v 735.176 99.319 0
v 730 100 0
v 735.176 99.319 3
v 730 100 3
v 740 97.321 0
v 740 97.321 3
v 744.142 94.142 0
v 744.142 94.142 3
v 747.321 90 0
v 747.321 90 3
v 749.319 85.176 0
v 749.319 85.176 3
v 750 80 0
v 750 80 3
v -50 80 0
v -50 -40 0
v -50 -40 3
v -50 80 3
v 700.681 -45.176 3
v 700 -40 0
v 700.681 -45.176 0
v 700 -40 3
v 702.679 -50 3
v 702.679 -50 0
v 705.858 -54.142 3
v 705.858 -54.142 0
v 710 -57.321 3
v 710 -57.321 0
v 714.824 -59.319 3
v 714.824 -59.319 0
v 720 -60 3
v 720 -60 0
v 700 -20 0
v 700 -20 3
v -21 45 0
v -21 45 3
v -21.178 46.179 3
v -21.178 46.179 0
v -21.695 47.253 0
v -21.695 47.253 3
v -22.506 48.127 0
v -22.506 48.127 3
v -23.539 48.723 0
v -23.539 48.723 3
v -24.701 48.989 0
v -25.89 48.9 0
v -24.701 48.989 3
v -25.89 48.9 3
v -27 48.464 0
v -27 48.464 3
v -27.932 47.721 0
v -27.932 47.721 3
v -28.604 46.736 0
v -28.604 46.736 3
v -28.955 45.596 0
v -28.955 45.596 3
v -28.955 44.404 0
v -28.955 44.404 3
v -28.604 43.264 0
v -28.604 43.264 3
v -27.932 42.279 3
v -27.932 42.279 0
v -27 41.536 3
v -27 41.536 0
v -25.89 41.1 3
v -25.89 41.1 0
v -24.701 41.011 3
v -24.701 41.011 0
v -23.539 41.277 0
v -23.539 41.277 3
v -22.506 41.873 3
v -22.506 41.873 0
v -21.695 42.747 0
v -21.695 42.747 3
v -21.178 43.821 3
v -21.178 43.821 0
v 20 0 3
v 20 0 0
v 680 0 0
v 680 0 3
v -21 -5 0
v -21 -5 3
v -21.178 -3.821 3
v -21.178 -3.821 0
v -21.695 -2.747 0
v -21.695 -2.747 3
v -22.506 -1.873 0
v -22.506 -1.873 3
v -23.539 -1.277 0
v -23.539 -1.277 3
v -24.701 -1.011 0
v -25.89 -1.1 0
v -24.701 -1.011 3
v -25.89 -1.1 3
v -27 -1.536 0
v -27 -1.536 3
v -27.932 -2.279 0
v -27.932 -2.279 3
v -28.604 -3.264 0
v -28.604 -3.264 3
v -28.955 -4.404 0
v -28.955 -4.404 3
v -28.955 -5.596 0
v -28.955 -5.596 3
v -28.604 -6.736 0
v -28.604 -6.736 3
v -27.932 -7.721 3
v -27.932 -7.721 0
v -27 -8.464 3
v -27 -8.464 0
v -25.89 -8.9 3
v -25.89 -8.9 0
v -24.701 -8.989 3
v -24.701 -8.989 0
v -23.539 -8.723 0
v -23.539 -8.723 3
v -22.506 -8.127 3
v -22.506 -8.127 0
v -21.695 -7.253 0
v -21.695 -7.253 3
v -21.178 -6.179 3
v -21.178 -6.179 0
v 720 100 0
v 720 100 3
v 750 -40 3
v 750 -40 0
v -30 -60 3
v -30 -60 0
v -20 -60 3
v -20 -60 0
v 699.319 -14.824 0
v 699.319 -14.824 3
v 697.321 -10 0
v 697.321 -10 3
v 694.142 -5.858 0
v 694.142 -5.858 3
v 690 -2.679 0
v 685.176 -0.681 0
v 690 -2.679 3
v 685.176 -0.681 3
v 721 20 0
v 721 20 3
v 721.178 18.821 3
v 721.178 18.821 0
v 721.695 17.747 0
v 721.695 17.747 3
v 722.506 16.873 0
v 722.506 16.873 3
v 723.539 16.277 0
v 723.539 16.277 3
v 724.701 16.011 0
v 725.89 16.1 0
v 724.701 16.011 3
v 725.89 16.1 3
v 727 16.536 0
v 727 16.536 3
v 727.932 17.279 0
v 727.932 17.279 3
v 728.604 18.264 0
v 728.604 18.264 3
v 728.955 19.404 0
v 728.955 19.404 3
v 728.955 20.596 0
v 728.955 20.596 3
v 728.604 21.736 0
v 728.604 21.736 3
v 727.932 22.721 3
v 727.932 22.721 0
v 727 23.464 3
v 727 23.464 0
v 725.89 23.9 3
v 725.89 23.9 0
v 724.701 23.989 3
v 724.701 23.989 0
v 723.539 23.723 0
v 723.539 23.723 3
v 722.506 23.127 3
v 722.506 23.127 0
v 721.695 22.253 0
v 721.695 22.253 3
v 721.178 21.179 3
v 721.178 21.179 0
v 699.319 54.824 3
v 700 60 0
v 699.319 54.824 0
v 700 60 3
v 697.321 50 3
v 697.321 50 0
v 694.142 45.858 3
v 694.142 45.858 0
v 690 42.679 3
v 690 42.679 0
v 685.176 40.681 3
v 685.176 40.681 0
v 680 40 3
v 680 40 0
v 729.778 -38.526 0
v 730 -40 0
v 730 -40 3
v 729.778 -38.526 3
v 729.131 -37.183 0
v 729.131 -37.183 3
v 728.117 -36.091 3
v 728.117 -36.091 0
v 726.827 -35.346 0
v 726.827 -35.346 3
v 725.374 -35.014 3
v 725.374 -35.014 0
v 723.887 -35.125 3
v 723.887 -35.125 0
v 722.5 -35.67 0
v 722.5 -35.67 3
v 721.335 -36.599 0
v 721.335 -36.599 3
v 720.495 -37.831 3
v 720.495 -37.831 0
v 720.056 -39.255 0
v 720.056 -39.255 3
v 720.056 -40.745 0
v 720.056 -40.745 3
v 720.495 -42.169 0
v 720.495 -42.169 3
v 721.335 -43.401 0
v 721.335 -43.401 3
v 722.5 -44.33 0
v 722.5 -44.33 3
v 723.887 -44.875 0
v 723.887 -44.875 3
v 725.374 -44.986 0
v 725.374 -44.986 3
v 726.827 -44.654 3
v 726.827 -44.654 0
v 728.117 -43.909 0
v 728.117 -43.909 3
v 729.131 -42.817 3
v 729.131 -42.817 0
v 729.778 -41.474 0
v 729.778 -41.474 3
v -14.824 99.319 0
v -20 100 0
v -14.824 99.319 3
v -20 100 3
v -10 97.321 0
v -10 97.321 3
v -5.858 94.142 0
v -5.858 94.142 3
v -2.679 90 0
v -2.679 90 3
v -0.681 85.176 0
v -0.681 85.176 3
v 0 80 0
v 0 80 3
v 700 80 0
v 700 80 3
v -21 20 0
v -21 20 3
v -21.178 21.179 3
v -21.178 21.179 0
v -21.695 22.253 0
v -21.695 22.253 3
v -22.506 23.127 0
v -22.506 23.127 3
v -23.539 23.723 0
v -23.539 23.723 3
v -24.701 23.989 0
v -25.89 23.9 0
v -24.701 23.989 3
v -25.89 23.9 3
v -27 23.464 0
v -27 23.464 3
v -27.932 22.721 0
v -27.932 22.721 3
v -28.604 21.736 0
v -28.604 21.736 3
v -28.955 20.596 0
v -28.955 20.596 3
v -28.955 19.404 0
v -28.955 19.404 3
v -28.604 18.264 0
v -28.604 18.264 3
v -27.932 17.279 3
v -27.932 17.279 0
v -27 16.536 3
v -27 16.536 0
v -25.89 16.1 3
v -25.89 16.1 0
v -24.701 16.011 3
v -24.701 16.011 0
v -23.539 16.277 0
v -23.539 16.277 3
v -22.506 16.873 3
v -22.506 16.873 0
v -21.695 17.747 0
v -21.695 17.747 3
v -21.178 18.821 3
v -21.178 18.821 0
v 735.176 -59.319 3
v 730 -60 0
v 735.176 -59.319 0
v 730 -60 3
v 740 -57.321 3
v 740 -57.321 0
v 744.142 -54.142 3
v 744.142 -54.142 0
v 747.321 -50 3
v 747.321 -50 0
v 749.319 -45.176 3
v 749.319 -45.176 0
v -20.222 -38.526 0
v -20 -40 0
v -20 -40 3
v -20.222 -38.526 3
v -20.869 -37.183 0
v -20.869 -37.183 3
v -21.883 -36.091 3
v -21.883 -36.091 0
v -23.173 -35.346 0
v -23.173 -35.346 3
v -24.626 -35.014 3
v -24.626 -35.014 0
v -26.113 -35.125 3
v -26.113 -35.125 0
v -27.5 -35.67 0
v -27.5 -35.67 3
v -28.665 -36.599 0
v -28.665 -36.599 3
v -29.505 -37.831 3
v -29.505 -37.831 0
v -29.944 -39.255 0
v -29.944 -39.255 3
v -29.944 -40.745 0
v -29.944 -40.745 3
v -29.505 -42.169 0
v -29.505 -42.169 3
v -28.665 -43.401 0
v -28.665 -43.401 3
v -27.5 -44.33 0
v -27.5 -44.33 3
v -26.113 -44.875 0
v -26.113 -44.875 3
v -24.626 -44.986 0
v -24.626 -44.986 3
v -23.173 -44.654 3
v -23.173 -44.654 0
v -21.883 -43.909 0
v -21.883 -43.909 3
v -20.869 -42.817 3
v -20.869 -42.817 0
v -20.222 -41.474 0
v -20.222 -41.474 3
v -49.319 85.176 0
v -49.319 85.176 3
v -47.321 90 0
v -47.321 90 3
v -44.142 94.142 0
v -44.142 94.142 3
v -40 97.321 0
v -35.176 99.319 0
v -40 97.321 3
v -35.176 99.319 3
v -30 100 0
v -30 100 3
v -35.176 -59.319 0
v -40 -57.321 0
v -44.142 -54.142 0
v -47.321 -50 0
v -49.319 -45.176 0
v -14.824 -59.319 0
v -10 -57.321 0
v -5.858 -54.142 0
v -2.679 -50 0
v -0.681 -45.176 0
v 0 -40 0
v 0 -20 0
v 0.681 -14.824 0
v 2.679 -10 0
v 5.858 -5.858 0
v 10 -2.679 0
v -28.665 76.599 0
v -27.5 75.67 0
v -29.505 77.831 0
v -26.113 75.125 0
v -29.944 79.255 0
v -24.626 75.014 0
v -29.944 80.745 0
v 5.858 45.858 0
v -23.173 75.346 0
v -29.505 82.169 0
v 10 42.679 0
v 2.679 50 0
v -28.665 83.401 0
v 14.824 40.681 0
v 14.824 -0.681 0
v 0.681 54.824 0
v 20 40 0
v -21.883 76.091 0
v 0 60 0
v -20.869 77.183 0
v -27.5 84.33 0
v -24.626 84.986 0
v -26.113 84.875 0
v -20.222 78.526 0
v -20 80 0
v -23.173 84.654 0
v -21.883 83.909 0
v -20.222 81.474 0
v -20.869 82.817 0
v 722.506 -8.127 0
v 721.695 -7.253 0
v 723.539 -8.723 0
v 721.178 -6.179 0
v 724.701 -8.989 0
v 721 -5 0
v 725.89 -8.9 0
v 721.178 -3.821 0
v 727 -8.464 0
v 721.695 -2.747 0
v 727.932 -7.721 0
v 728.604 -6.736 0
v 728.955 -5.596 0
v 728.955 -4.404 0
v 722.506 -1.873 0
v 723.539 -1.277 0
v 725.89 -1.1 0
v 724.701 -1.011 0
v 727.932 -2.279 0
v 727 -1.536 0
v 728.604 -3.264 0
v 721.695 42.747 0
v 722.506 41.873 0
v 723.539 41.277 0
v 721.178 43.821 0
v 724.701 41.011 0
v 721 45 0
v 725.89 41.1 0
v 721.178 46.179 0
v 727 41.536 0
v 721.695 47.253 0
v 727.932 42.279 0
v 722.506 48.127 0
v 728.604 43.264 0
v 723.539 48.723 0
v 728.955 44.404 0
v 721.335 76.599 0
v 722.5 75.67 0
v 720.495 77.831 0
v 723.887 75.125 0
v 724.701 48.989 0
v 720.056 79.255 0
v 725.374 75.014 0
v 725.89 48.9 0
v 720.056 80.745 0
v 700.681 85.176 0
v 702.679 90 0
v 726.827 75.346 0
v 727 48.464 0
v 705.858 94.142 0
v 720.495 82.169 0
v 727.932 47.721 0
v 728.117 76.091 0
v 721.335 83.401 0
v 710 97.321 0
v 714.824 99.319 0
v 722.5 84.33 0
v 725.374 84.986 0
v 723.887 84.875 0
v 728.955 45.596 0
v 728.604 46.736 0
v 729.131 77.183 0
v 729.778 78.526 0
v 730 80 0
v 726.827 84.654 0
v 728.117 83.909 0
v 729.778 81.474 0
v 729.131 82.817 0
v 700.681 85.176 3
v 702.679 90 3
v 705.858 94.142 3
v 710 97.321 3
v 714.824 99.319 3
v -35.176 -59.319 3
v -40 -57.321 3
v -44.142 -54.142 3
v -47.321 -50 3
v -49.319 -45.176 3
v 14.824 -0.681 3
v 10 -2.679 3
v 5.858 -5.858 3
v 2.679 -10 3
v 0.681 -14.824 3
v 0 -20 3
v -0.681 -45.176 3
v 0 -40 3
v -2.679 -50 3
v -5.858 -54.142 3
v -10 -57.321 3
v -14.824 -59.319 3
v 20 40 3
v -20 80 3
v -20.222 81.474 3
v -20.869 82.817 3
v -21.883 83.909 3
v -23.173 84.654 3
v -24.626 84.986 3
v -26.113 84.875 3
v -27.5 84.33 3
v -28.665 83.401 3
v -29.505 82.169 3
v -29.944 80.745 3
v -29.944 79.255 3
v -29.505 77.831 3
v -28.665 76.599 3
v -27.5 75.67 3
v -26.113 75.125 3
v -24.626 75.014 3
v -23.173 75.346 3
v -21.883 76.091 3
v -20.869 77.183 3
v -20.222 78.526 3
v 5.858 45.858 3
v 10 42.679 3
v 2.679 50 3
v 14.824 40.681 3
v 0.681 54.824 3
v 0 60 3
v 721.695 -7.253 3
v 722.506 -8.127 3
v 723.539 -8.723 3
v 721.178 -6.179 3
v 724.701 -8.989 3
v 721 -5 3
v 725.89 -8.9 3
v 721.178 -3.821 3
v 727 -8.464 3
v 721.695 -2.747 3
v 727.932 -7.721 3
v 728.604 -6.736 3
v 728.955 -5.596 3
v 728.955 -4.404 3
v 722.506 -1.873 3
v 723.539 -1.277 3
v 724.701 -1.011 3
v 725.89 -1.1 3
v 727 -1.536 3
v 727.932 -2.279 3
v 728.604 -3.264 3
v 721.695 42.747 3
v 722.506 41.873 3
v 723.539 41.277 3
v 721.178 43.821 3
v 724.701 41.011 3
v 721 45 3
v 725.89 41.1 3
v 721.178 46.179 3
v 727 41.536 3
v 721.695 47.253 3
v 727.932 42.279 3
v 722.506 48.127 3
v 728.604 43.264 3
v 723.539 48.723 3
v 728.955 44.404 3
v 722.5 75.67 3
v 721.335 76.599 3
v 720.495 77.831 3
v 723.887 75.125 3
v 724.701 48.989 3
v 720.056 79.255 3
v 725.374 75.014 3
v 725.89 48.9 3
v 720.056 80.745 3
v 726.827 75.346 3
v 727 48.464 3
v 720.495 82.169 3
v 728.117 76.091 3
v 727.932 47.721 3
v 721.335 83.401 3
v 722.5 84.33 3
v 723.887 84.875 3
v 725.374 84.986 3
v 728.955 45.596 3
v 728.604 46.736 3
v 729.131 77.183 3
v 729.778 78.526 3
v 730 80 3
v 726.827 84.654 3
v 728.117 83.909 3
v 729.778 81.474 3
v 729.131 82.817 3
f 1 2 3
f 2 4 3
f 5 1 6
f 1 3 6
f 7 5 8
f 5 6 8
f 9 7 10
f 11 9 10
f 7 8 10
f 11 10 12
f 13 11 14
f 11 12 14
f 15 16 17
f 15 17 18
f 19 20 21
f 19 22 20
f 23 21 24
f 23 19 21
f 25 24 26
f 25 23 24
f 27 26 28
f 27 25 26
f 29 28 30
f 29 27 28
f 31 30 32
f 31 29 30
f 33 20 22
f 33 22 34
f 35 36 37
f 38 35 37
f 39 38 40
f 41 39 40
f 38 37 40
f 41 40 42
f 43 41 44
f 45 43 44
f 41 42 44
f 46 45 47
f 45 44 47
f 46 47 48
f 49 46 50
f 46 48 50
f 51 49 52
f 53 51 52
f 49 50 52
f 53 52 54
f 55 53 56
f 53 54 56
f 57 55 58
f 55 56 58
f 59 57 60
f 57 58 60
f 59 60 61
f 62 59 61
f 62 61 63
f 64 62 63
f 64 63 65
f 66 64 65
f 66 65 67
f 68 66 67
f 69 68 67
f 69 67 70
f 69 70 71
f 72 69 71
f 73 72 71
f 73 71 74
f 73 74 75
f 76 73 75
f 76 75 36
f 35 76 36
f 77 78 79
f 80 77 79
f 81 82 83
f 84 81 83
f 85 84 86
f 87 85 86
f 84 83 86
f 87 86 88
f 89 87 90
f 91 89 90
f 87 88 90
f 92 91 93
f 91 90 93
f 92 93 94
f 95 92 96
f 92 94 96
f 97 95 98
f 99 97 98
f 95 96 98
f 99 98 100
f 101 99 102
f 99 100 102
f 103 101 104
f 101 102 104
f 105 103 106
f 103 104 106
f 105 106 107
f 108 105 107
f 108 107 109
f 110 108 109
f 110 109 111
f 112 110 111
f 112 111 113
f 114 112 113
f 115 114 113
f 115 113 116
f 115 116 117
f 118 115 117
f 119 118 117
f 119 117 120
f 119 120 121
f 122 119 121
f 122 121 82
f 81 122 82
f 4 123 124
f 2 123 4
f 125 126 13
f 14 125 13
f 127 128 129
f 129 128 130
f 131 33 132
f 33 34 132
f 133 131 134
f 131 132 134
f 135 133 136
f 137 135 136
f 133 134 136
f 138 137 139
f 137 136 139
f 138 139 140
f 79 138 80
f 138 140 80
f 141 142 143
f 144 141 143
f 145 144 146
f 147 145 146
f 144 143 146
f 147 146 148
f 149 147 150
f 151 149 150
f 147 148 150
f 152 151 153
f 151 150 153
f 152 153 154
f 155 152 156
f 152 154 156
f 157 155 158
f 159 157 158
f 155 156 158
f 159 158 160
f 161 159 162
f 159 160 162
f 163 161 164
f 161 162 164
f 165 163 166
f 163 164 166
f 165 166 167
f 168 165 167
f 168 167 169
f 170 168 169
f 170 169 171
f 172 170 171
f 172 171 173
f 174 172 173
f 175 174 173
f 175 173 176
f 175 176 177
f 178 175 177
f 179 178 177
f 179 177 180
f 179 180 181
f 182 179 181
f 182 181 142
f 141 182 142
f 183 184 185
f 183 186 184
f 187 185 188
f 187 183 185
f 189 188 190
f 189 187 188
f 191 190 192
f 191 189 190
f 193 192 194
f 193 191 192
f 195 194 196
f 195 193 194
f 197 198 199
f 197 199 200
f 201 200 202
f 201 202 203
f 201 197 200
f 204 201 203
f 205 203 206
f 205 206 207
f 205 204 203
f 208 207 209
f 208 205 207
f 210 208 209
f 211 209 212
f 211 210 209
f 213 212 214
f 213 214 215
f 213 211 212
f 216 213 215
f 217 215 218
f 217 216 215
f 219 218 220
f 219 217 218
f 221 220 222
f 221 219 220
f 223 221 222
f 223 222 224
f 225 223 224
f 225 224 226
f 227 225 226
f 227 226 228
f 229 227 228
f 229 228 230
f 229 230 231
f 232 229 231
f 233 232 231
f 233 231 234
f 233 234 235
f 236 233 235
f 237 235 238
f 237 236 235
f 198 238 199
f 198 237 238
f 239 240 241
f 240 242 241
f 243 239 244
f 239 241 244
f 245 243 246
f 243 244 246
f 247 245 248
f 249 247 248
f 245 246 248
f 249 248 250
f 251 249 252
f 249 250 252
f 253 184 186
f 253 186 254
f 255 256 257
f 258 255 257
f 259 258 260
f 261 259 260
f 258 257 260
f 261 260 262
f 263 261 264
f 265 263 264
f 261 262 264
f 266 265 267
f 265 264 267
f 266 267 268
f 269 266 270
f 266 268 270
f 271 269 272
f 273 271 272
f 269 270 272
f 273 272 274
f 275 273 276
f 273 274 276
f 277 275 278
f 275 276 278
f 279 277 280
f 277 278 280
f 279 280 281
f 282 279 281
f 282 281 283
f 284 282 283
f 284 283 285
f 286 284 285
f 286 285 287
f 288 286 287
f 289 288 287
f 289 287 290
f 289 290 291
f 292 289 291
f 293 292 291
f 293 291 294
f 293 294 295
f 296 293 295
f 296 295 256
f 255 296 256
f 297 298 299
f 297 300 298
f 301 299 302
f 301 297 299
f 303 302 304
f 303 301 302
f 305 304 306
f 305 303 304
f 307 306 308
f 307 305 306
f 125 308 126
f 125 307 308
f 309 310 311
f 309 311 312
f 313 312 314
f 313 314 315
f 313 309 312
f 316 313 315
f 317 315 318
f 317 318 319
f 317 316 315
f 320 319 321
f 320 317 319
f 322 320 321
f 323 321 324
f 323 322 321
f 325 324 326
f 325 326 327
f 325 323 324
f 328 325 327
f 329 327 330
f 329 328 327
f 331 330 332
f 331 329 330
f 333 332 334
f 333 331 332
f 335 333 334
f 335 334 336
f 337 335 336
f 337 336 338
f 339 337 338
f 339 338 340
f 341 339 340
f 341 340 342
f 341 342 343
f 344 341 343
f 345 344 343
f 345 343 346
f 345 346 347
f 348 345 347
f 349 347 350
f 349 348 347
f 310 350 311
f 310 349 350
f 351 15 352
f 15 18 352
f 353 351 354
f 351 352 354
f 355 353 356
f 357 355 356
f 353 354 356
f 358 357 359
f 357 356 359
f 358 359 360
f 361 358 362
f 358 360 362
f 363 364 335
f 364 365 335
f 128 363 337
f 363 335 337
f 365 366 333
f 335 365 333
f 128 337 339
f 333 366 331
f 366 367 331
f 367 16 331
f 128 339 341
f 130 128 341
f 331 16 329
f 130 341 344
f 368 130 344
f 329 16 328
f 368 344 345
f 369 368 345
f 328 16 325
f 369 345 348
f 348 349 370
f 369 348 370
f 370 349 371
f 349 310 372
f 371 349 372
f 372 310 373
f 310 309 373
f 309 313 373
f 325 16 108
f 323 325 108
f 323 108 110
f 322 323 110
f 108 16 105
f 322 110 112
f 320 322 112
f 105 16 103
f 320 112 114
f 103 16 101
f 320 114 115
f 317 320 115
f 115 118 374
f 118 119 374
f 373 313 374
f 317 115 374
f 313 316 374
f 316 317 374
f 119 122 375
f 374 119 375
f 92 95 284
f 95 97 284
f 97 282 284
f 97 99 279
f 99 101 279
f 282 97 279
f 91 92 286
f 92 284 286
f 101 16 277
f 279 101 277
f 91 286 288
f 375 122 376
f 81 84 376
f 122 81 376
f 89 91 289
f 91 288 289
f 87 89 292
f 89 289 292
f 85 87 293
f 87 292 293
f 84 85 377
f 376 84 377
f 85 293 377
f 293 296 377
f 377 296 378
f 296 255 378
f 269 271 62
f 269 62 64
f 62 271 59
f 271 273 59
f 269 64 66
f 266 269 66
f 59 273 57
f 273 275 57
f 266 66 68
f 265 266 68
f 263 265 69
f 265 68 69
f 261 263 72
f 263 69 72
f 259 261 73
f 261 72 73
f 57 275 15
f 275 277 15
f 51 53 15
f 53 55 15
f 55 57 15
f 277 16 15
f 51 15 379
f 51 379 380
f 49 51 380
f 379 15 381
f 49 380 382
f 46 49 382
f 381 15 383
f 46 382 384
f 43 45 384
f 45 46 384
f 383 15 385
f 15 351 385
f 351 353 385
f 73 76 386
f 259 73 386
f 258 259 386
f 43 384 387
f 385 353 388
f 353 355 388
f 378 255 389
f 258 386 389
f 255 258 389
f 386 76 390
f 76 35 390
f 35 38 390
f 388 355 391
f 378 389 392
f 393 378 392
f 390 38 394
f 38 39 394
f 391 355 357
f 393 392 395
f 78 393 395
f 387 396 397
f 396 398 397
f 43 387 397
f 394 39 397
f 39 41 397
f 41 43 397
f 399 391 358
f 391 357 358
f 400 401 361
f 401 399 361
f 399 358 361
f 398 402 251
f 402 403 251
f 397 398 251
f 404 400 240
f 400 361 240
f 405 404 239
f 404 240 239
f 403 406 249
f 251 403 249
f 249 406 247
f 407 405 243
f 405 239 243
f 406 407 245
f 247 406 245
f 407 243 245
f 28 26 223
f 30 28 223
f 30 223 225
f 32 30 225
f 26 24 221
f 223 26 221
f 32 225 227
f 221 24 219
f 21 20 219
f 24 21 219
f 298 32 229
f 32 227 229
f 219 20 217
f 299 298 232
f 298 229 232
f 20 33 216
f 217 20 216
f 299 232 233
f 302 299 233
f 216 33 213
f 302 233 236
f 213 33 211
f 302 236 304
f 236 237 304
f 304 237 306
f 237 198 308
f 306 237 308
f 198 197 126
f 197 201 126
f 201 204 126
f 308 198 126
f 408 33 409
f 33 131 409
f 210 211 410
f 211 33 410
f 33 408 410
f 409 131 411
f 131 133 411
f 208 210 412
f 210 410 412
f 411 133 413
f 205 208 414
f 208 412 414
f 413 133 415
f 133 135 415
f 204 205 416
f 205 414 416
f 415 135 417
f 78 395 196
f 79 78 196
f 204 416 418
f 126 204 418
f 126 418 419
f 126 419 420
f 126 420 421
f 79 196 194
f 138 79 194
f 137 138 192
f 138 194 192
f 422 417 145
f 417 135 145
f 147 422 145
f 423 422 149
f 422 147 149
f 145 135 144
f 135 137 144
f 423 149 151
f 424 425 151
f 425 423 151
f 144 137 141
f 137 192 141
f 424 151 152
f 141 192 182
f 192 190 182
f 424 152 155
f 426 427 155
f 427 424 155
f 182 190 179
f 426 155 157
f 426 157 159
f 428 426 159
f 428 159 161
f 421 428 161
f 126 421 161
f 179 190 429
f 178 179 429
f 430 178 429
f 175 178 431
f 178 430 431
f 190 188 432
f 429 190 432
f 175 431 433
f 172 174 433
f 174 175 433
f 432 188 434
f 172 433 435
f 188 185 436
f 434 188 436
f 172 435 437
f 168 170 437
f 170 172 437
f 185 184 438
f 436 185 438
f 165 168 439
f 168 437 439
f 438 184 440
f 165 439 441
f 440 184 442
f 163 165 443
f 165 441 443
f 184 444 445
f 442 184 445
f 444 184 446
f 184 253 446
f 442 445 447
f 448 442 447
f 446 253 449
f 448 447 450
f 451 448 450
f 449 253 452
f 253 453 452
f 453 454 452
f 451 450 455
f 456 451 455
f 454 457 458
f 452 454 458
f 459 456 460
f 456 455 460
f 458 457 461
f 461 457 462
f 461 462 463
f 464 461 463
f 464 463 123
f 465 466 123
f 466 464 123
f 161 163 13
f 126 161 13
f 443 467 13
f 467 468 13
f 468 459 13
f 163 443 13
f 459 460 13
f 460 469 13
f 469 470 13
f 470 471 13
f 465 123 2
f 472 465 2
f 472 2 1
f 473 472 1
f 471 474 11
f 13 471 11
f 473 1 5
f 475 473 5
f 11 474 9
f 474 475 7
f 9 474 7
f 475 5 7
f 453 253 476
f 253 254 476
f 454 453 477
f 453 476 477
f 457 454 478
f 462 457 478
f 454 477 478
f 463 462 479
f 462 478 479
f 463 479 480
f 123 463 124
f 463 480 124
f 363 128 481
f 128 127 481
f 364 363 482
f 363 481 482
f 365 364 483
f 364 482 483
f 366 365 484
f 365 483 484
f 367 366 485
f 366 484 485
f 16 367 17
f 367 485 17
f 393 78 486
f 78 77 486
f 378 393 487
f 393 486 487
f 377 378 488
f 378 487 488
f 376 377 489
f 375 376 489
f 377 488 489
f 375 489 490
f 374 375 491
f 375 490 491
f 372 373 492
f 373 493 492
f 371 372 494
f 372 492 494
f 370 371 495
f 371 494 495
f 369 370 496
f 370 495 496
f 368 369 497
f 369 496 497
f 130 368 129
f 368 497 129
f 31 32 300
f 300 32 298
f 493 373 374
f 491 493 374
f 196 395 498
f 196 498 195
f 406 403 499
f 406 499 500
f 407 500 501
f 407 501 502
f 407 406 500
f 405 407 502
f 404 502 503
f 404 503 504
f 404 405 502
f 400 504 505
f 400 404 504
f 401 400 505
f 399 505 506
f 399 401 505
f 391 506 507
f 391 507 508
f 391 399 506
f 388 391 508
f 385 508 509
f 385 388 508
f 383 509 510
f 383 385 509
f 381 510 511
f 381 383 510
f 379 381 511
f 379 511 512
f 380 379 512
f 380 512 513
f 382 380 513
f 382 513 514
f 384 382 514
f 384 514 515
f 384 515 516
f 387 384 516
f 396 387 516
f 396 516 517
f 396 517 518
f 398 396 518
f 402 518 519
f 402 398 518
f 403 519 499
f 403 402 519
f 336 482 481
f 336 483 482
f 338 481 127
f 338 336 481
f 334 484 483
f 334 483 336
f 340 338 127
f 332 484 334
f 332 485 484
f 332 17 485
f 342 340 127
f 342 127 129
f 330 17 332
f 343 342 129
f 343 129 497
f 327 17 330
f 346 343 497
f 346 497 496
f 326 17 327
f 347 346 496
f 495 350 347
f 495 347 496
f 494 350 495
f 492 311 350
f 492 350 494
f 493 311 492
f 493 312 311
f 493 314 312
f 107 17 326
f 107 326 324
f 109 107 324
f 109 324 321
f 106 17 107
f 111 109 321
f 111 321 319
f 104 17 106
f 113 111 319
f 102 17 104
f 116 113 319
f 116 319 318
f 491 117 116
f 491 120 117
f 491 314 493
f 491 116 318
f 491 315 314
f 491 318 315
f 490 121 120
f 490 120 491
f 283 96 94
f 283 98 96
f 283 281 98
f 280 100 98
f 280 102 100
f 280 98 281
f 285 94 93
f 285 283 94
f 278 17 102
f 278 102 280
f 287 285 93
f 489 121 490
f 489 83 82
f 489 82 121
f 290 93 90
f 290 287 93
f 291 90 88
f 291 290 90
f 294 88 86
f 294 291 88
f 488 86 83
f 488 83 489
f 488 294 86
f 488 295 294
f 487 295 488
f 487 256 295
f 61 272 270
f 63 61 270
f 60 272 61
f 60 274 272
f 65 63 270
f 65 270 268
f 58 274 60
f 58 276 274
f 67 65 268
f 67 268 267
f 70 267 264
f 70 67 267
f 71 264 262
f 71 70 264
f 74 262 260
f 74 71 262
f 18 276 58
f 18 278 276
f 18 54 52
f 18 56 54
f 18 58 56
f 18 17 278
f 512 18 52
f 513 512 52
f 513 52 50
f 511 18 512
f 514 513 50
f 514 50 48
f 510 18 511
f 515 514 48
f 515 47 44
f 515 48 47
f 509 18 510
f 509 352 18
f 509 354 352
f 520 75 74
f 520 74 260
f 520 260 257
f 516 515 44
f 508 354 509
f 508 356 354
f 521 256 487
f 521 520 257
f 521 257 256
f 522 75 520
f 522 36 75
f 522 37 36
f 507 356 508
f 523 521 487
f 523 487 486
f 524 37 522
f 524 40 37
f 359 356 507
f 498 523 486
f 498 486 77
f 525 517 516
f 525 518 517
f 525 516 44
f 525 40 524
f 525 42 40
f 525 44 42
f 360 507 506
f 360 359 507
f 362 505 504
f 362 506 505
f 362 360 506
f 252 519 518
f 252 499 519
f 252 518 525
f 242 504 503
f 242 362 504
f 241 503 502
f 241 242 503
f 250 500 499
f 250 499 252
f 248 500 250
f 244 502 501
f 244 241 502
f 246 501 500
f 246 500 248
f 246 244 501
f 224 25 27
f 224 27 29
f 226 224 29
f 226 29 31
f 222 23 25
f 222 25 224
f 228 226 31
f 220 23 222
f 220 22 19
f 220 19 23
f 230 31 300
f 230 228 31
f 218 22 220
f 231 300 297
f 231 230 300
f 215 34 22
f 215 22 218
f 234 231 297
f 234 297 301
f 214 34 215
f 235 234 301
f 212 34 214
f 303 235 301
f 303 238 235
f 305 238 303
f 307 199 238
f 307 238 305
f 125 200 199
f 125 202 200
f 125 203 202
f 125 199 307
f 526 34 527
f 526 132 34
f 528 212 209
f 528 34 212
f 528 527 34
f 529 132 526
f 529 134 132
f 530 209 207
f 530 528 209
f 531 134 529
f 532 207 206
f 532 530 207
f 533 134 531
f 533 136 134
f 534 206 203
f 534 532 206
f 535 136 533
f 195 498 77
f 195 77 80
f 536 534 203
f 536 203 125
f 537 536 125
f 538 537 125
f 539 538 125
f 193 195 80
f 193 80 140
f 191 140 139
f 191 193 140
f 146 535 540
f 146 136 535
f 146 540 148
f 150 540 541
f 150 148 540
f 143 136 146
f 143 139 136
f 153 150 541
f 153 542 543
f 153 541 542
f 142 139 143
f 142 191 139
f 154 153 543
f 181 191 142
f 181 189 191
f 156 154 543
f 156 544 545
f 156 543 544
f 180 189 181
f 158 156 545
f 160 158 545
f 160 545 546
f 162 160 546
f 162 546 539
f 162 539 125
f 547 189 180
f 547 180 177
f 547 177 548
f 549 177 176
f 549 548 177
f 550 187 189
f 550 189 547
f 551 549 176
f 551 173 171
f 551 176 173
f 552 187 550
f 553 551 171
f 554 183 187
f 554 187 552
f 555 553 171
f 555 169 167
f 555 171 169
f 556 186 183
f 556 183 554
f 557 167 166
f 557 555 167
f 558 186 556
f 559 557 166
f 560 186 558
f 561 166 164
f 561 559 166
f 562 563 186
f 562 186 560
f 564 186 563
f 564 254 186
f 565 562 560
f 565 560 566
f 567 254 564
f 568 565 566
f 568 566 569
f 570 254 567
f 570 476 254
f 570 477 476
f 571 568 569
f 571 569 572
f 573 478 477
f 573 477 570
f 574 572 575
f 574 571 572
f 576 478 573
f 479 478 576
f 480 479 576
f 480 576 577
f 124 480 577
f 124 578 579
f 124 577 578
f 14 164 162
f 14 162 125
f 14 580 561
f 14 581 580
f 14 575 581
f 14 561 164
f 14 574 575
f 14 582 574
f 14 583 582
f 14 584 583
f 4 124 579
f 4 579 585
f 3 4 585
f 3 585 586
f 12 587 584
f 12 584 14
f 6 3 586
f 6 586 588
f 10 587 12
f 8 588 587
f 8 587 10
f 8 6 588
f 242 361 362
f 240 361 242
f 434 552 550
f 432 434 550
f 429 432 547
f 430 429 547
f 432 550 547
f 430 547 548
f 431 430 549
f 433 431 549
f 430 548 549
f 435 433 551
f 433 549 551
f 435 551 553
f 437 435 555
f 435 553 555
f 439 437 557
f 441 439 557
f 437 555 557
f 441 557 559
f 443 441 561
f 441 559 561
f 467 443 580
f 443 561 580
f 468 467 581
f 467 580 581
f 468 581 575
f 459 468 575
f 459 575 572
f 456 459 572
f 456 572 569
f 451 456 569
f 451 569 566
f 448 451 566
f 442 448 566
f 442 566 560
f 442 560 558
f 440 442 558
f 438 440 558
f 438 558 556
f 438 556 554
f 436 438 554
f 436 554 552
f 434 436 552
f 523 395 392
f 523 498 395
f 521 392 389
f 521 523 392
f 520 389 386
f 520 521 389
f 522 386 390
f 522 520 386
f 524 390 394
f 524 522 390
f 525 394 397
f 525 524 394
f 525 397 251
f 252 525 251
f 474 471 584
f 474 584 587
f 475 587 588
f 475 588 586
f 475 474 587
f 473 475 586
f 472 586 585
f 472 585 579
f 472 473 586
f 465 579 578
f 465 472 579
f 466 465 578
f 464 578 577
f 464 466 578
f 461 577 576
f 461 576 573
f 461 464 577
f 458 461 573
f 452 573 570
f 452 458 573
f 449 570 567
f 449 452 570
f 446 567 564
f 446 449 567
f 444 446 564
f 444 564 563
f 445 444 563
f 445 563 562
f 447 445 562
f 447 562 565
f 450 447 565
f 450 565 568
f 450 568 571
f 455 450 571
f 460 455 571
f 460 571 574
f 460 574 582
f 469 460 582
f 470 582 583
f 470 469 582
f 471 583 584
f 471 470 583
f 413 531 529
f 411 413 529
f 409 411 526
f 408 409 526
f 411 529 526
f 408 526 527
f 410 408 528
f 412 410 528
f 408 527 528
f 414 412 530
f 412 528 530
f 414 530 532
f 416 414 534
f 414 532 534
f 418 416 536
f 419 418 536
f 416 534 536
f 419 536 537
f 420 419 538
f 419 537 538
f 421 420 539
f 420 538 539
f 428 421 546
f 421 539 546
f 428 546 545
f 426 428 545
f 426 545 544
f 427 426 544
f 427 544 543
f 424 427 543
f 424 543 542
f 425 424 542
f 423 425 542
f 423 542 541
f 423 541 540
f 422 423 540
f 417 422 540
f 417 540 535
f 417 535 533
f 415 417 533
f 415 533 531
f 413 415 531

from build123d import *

# Parameters (mm, degrees)
SKETCH1_W           = 700
SKETCH1_H           = 40
SKETCH1_W_2         = 50
SKETCH1_H_2         = 160
SKETCH1_R           = 5
BOSS_EXTRUDE1_DEPTH = 3
FILLET1_R           = 20
SKETCH2_R           = 4
CUT_EXTRUDE1_DEPTH  = 757.643244865


with BuildPart() as part:
    # Sketch1 → Boss-Extrude1 (new body)
    # profile 1 of 3: a face of its own
    with BuildSketch(Plane.XY):
        with Locations((350, 20)):
            Rectangle(SKETCH1_W, SKETCH1_H)
    # profile 2 of 3: a face of its own
    with BuildSketch(Plane.XY):
        with Locations((-25, 20)):
            Rectangle(SKETCH1_W_2, SKETCH1_H_2)
        with Locations((-25, 80)):
            Circle(SKETCH1_R, mode=Mode.SUBTRACT)
        with Locations((-25, -40)):
            Circle(SKETCH1_R, mode=Mode.SUBTRACT)
    # profile 3 of 3: a face of its own
    with BuildSketch(Plane.XY):
        with Locations((725, 20)):
            Rectangle(SKETCH1_W_2, SKETCH1_H_2)
        with Locations((725, 80)):
            Circle(SKETCH1_R, mode=Mode.SUBTRACT)
        with Locations((725, -40)):
            Circle(SKETCH1_R, mode=Mode.SUBTRACT)
    extrude(amount=BOSS_EXTRUDE1_DEPTH)

    # Fillet1
    fillet1_edges = [part.edges().sort_by_distance(p)[0] for p in [
        (0, 0, 1.5),
        (0, -60, 1.5),
        (-50, -60, 1.5),
        (-50, 100, 1.5),
        (0, 100, 1.5),
        (0, 40, 1.5),
        (700, 40, 1.5),
        (700, 100, 1.5),
        (750, 100, 1.5),
        (750, -60, 1.5),
        (700, -60, 1.5),
        (700, 0, 1.5),
    ]]
    fillet(fillet1_edges, radius=FILLET1_R)

    # Sketch2 → Cut-Extrude1 (cut, through all)
    with BuildSketch(Plane.XY.offset(3)):
        with Locations((-25, 45)):
            Circle(SKETCH2_R)
        with Locations((-25, -5)):
            Circle(SKETCH2_R)
        with Locations((-25, 20)):
            Circle(SKETCH2_R)
        with Locations(Location((725, 20, 0), (0, 0, 180))):
            Circle(SKETCH2_R)
        with Locations(Location((725, -5, 0), (0, 0, 180))):
            Circle(SKETCH2_R)
        with Locations(Location((725, 45, 0), (0, 0, 180))):
            Circle(SKETCH2_R)
    extrude(amount=-CUT_EXTRUDE1_DEPTH, mode=Mode.SUBTRACT)


solid = part.part
